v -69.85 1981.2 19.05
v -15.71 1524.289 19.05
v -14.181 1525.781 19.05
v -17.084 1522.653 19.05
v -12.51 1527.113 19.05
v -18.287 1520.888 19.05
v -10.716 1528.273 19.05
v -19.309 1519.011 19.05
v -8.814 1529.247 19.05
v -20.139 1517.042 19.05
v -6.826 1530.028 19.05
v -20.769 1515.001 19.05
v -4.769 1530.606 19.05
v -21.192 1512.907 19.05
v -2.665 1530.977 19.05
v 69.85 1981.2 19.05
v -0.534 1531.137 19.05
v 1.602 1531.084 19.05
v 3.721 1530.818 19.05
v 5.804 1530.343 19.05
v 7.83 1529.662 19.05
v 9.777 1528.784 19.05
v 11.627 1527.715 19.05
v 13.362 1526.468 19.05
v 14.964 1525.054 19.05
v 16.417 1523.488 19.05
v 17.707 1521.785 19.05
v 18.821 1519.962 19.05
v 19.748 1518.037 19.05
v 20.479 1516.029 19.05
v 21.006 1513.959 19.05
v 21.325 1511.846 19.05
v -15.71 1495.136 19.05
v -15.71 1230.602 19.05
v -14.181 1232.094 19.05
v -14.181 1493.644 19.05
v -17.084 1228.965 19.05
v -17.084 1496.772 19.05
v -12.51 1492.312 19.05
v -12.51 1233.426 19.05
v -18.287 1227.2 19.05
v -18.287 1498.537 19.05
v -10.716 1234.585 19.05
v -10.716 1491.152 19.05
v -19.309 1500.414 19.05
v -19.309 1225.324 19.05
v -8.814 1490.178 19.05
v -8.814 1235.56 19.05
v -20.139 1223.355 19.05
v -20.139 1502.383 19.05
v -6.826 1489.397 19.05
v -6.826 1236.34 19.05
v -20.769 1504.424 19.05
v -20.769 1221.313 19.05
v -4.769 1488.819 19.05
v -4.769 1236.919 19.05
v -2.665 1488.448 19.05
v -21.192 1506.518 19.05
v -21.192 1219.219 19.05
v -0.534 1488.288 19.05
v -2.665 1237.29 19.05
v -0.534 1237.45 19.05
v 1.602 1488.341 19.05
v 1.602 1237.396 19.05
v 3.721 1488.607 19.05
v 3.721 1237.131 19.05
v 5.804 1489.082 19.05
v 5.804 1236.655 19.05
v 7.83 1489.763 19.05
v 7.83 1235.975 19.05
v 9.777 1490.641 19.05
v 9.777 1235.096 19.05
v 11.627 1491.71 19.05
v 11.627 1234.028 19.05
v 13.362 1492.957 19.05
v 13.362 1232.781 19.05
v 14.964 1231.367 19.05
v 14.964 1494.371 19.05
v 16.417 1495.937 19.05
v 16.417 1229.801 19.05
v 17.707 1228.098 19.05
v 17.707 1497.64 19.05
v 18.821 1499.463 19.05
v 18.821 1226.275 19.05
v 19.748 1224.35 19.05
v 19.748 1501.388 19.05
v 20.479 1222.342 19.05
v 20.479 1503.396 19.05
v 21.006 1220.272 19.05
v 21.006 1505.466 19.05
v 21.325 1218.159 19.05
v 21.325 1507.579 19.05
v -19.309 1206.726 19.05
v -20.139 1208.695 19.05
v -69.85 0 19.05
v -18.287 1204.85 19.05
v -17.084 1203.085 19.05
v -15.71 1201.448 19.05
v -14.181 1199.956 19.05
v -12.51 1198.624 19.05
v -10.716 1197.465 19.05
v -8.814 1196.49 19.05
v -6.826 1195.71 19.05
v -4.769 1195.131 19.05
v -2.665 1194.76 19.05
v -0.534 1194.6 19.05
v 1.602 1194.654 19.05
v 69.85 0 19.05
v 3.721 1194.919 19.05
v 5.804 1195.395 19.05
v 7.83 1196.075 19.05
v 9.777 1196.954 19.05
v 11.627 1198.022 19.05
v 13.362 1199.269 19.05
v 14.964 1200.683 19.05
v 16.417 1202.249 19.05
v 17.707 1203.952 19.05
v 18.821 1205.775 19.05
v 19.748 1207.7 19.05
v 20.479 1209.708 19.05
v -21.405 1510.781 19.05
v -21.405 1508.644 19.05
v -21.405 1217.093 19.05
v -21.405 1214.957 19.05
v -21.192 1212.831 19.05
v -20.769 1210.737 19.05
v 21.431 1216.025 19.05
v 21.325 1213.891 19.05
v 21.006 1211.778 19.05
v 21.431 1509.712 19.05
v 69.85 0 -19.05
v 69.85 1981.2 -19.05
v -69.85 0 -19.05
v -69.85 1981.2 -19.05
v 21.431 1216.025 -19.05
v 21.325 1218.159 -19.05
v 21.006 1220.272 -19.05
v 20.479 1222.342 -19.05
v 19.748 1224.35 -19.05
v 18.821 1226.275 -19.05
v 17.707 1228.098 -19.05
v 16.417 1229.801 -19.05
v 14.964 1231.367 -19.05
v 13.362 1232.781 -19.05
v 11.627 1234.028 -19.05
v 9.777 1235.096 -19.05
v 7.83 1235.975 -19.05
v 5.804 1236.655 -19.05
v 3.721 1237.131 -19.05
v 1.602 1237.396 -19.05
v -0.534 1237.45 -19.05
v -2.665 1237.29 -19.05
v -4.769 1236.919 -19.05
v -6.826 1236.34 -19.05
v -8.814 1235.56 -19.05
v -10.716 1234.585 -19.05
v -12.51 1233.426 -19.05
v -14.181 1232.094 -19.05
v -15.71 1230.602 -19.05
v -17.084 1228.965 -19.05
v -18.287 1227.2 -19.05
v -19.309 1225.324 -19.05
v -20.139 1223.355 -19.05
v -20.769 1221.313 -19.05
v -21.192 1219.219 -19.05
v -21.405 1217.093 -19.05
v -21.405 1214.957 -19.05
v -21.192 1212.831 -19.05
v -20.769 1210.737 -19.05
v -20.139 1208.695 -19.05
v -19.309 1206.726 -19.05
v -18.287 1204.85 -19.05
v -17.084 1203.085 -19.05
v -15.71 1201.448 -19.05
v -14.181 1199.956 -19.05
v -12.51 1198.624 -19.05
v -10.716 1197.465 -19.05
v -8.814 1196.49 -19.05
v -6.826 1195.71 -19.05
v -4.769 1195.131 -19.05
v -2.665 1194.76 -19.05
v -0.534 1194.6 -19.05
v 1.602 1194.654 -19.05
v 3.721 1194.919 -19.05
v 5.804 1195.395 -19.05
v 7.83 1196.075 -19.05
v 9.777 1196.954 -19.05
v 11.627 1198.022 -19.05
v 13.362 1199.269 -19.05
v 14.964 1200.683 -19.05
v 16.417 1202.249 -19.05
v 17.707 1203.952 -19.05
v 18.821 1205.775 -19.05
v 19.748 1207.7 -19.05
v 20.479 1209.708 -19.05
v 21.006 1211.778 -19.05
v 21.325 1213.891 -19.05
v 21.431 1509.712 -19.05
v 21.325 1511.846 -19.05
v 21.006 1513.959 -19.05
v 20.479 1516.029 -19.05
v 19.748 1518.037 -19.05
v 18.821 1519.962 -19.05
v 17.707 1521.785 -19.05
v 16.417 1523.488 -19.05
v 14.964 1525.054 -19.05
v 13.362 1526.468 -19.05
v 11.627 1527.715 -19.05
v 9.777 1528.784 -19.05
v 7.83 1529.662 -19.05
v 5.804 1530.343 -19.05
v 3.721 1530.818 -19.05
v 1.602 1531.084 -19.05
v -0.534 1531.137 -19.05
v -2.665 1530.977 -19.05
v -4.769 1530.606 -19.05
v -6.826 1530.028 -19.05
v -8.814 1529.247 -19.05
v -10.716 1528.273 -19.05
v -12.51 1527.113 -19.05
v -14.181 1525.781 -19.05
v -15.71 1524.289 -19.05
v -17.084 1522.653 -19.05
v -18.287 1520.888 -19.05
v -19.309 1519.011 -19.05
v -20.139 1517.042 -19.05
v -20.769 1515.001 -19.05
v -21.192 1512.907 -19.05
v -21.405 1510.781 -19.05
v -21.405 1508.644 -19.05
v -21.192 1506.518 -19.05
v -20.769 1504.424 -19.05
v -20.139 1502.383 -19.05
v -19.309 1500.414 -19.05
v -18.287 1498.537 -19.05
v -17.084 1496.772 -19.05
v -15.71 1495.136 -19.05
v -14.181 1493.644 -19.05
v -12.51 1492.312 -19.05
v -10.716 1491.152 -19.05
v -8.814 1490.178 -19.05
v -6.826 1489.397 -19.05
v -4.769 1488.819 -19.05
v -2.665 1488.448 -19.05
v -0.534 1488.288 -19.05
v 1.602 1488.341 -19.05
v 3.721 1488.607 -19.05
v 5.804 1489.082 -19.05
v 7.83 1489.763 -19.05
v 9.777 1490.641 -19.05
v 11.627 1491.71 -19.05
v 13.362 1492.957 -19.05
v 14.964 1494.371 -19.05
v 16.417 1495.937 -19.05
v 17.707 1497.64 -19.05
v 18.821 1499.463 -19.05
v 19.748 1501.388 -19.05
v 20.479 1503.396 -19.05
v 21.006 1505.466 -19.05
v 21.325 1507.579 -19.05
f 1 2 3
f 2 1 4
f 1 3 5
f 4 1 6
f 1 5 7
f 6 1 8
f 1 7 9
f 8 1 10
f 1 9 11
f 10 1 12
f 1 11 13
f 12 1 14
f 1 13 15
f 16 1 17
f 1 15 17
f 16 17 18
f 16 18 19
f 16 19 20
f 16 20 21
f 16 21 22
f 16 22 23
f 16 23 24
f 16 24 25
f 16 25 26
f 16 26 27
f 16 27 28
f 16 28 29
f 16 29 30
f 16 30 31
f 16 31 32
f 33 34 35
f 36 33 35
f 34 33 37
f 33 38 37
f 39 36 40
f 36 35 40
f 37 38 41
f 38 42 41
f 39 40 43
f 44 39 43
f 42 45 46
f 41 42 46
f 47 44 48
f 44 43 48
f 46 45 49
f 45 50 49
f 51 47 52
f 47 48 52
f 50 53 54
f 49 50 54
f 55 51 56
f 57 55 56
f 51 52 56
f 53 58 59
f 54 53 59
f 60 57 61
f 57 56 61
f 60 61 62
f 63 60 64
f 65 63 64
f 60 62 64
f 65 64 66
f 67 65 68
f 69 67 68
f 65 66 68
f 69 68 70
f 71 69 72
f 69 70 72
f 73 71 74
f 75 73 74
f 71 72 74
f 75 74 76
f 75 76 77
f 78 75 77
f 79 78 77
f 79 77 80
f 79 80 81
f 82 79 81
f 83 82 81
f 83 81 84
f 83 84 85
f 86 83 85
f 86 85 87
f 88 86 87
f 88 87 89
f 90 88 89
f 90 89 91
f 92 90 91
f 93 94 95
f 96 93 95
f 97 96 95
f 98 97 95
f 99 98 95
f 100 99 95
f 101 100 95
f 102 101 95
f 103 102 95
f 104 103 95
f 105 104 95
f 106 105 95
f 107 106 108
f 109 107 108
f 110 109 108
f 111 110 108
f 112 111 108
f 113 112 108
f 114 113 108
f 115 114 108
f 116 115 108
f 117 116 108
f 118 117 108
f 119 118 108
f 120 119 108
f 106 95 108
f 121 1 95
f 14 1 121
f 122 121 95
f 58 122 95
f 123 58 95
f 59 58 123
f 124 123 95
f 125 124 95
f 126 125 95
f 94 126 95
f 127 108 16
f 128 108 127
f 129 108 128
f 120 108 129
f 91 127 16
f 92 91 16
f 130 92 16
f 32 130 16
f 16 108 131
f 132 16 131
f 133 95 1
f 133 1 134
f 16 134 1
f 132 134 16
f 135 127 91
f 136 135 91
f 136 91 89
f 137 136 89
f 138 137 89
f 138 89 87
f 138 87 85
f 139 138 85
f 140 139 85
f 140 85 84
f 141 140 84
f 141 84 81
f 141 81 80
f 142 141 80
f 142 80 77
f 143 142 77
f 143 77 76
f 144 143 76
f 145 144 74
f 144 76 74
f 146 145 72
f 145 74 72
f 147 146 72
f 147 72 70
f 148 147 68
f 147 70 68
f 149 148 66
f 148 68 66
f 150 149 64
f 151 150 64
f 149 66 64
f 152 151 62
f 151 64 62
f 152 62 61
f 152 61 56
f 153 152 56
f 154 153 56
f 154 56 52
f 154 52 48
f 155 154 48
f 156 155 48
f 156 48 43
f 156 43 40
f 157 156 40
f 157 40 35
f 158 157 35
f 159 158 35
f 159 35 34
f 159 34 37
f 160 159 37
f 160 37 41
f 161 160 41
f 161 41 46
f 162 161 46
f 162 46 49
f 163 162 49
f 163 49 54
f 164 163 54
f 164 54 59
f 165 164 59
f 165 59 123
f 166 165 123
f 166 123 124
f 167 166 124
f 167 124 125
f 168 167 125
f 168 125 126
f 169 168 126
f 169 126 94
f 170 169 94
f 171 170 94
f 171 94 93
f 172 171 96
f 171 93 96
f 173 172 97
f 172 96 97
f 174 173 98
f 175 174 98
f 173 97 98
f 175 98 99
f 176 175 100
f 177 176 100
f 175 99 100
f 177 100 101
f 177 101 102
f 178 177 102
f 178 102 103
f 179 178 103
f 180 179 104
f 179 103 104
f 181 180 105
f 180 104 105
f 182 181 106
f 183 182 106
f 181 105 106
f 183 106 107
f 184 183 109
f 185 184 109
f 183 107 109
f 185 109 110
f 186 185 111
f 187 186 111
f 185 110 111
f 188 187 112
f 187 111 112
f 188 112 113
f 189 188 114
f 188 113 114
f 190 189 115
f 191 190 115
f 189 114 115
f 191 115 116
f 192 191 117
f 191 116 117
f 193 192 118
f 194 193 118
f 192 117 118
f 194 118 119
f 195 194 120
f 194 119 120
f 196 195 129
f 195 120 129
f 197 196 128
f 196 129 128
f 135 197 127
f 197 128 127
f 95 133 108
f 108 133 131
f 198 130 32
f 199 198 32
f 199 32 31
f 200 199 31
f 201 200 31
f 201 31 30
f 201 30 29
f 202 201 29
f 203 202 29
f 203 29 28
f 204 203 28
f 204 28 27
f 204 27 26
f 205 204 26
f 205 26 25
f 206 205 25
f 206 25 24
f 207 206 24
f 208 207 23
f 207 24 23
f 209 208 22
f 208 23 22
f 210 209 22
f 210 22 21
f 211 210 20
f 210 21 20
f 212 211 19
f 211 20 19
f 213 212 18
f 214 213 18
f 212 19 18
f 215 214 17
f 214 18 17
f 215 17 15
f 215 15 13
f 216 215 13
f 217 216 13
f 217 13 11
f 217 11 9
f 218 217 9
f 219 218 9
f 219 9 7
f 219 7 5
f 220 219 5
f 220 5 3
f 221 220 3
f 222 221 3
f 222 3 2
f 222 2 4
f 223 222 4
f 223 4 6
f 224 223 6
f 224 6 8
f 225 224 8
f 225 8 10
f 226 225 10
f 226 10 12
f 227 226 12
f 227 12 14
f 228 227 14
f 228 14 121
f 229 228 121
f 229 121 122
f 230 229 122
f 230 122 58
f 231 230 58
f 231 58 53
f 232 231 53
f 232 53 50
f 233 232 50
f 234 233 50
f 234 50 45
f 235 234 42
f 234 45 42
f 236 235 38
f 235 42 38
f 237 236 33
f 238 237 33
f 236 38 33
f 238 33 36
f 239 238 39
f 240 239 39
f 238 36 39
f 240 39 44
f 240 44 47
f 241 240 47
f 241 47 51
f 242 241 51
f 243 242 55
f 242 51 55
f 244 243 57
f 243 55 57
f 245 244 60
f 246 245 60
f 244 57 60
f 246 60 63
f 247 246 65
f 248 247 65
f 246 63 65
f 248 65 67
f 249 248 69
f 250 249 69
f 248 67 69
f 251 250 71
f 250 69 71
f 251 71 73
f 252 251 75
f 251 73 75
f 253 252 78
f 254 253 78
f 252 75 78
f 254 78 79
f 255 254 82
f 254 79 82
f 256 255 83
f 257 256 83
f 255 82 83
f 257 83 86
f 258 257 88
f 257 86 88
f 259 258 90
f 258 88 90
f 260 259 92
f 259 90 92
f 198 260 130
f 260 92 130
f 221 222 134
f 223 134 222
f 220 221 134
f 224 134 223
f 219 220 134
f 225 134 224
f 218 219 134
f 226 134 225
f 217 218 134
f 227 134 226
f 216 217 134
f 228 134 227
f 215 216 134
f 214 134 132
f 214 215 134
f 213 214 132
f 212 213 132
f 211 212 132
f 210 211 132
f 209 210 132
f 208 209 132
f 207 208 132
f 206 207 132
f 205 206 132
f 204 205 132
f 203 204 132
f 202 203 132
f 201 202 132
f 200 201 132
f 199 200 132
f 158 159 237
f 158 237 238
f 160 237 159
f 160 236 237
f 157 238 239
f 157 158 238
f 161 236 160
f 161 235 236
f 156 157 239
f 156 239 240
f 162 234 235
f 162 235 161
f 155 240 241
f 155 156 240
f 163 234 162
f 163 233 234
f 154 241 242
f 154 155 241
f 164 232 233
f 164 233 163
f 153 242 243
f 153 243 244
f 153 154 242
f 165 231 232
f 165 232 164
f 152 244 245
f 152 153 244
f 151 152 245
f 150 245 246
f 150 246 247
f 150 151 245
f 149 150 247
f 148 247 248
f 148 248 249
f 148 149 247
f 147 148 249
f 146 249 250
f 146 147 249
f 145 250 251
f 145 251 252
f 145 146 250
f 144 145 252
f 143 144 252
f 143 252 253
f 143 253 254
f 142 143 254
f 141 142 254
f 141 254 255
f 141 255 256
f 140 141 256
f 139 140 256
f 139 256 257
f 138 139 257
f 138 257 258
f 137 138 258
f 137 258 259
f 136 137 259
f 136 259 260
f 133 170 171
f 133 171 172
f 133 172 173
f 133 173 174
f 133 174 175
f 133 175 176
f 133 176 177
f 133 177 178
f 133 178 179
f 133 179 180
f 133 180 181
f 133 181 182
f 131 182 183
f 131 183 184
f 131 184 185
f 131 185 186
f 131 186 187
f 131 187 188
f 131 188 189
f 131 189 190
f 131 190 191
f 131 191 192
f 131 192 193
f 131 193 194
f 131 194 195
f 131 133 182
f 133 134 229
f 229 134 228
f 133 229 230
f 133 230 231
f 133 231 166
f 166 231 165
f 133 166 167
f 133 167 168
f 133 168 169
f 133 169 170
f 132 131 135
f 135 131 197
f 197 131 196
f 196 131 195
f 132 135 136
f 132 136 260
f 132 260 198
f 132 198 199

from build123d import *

# Parameters (mm, degrees)
SKETCH1_W                   = 139.7
SKETCH1_H                   = 38.1
BOSS_EXTRUDE1_DEPTH         = 1981.2
F_1_1_6875_DIAMETER_HOLE1_D = 42.8625


with BuildPart() as part:
    # Sketch1 → Boss-Extrude1 (new body)
    with BuildSketch(Plane(origin=(0, 0, 0), x_dir=(1, 0, 0), z_dir=(0, 1, 0))):
        Rectangle(SKETCH1_W, SKETCH1_H)
    extrude(amount=BOSS_EXTRUDE1_DEPTH)

    # 1 (1.6875) Diameter Hole1 (through all)
    with Locations(Plane(origin=(0, 0, -19.05), x_dir=(-1, 0, 0), z_dir=(0, 0, -1))):
        with Locations((0, 1216.025), (0, 1509.7125)):
            Hole(F_1_1_6875_DIAMETER_HOLE1_D / 2)


solid = part.part
